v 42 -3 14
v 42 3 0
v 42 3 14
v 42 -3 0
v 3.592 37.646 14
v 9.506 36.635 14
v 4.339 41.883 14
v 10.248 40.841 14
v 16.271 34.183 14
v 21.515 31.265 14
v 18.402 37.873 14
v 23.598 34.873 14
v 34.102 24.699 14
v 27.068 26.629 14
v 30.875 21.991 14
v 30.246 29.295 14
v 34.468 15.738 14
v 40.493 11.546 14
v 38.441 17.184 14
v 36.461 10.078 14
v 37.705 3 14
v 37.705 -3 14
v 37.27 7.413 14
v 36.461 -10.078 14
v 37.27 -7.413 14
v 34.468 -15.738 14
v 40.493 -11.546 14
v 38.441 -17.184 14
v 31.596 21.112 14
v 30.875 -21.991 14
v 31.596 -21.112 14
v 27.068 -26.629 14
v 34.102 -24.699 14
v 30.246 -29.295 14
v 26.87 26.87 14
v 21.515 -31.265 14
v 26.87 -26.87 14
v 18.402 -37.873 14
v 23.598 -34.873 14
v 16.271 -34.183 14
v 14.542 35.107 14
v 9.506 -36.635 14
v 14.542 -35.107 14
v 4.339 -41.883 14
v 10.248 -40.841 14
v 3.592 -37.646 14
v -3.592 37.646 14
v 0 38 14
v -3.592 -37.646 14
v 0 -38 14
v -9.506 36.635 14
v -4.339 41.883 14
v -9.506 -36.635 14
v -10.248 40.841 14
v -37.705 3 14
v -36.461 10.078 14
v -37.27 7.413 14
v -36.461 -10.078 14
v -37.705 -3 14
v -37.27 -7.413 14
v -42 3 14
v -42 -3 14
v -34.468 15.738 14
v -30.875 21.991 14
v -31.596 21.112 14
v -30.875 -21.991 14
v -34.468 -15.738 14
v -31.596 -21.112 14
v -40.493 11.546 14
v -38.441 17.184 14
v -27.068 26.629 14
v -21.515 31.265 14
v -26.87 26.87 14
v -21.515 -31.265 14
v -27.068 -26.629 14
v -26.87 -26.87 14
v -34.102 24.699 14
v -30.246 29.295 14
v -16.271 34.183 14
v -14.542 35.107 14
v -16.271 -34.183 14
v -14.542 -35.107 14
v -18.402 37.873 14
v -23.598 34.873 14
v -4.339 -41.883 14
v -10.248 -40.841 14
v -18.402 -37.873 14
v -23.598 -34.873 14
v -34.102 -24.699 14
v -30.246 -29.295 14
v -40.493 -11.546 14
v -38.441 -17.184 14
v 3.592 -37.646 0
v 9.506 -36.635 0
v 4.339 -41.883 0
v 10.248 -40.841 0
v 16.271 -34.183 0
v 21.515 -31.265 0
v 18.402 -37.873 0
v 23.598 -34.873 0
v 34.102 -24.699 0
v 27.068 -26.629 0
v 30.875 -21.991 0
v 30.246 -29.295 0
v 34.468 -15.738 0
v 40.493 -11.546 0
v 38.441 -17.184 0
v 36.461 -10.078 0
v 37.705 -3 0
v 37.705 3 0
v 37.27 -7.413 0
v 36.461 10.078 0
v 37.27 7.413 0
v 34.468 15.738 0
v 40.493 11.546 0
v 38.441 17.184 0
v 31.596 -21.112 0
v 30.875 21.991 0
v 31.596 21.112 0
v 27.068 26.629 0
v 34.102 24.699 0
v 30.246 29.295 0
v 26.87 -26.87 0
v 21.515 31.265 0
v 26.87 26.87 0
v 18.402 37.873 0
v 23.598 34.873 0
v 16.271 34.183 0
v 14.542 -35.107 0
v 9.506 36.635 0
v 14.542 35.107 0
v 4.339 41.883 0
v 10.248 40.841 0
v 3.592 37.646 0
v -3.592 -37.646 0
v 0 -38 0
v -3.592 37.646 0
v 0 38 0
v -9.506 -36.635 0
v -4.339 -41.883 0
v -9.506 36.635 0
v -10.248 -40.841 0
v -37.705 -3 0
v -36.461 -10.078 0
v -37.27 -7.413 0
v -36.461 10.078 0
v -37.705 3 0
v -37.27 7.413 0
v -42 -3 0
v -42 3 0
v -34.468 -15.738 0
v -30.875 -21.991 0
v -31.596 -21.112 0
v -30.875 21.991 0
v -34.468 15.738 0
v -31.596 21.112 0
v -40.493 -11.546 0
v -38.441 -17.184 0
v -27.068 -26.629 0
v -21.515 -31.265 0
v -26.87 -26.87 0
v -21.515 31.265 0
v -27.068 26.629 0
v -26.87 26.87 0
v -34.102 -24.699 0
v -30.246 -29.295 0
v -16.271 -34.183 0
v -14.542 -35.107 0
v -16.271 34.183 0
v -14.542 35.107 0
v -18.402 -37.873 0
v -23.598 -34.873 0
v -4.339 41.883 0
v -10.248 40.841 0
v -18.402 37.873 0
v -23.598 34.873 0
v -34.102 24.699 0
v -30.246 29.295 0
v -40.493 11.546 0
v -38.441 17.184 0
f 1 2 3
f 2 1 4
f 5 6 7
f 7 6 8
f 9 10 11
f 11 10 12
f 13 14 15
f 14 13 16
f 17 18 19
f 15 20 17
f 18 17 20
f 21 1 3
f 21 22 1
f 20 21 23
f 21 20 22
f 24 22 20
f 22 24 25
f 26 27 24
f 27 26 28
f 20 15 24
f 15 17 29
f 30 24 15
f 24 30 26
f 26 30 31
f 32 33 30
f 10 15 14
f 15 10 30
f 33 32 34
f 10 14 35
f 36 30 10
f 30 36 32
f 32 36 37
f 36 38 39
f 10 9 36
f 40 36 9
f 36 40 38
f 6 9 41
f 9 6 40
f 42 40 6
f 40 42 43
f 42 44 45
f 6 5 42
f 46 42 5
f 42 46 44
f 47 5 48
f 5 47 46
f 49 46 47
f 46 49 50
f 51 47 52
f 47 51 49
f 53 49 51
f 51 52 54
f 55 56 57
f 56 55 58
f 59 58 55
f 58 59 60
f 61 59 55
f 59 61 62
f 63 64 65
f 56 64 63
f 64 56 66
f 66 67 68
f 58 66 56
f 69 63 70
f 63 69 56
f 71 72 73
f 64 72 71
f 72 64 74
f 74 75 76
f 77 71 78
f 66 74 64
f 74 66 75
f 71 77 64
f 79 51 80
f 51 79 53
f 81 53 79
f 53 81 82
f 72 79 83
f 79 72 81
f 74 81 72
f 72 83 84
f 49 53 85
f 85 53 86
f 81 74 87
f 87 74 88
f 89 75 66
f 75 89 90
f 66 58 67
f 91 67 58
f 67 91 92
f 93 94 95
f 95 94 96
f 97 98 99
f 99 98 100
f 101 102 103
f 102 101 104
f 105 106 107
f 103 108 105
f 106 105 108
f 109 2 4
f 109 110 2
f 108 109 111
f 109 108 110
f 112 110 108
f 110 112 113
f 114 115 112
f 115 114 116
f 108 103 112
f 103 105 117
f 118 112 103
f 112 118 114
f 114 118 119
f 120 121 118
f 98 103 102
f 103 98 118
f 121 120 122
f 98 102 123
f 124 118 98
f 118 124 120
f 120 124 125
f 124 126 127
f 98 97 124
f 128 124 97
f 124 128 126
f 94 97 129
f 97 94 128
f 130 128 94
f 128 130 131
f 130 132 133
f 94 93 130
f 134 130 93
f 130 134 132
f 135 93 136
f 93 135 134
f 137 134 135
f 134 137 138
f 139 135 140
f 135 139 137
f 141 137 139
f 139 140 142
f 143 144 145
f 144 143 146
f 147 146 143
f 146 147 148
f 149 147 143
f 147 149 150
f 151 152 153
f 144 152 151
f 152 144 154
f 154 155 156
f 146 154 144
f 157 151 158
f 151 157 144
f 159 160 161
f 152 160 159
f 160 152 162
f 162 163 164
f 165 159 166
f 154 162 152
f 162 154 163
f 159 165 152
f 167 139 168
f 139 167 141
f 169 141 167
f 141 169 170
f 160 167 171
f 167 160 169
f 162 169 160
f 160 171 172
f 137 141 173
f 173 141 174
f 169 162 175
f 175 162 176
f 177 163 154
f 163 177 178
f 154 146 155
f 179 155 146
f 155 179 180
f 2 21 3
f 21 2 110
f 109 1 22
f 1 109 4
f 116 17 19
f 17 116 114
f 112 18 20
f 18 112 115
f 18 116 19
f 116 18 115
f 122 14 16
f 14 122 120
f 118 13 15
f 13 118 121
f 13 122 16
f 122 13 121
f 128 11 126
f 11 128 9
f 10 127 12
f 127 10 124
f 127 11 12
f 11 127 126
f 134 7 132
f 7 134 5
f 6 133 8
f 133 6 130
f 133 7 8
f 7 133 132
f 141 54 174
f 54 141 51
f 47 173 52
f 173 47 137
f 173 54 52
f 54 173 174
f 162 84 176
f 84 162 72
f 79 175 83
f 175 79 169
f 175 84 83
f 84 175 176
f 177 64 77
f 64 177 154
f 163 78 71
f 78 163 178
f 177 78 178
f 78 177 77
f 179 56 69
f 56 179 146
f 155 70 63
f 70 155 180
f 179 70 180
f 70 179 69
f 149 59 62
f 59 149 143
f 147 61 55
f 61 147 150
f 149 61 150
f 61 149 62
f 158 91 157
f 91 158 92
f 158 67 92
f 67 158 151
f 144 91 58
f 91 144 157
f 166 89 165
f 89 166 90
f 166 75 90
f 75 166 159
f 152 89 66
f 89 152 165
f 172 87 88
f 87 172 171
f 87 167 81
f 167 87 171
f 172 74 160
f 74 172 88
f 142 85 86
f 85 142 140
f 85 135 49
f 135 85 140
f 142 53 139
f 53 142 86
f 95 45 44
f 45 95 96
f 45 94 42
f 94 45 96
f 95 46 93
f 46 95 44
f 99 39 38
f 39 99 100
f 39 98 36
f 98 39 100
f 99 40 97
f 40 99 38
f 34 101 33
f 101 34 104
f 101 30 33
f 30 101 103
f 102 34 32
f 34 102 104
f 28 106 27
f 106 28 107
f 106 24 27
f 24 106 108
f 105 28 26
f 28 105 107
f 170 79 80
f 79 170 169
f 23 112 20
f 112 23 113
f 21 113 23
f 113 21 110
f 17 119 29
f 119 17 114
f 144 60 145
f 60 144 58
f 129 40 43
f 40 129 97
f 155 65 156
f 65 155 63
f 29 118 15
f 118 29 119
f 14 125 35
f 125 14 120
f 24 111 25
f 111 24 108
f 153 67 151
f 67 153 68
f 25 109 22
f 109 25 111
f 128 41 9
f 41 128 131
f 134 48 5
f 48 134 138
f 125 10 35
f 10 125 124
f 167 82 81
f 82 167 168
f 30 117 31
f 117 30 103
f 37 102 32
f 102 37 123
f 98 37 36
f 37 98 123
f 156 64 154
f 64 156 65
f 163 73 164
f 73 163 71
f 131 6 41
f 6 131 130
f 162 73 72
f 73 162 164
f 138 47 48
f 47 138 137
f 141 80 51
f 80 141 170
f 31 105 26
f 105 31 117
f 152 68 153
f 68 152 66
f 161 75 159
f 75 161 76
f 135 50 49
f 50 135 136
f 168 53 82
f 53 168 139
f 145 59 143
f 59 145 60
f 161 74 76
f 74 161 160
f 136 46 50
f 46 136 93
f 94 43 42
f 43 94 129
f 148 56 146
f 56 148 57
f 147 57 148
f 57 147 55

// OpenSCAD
$fn = 32;

// ----------------------------------------------------------------------
// Spur blank: plain gear blank
// ----------------------------------------------------------------------

// --- parameters (mm) ---
disc_r = 38;              // blank root radius
disc_t = 14;              // blank thickness
n_teeth = 18;             // stub tooth count
tooth_w = 6;              // tooth width at the root
tooth_h = 4;              // tooth height above the root

out_r = disc_r + tooth_h;  // tip radius
bbox_x = 84.0;  // measured width over the teeth
bbox_y = 83.77;  // measured depth over the teeth

union() {
  cylinder(r = disc_r, h = disc_t);
  for (i = [0 : n_teeth - 1])
    rotate([0, 0, i * 360 / n_teeth])
      translate([disc_r - 1, -tooth_w / 2, 0])
        cube([tooth_h + 1, tooth_w, disc_t]);
}
